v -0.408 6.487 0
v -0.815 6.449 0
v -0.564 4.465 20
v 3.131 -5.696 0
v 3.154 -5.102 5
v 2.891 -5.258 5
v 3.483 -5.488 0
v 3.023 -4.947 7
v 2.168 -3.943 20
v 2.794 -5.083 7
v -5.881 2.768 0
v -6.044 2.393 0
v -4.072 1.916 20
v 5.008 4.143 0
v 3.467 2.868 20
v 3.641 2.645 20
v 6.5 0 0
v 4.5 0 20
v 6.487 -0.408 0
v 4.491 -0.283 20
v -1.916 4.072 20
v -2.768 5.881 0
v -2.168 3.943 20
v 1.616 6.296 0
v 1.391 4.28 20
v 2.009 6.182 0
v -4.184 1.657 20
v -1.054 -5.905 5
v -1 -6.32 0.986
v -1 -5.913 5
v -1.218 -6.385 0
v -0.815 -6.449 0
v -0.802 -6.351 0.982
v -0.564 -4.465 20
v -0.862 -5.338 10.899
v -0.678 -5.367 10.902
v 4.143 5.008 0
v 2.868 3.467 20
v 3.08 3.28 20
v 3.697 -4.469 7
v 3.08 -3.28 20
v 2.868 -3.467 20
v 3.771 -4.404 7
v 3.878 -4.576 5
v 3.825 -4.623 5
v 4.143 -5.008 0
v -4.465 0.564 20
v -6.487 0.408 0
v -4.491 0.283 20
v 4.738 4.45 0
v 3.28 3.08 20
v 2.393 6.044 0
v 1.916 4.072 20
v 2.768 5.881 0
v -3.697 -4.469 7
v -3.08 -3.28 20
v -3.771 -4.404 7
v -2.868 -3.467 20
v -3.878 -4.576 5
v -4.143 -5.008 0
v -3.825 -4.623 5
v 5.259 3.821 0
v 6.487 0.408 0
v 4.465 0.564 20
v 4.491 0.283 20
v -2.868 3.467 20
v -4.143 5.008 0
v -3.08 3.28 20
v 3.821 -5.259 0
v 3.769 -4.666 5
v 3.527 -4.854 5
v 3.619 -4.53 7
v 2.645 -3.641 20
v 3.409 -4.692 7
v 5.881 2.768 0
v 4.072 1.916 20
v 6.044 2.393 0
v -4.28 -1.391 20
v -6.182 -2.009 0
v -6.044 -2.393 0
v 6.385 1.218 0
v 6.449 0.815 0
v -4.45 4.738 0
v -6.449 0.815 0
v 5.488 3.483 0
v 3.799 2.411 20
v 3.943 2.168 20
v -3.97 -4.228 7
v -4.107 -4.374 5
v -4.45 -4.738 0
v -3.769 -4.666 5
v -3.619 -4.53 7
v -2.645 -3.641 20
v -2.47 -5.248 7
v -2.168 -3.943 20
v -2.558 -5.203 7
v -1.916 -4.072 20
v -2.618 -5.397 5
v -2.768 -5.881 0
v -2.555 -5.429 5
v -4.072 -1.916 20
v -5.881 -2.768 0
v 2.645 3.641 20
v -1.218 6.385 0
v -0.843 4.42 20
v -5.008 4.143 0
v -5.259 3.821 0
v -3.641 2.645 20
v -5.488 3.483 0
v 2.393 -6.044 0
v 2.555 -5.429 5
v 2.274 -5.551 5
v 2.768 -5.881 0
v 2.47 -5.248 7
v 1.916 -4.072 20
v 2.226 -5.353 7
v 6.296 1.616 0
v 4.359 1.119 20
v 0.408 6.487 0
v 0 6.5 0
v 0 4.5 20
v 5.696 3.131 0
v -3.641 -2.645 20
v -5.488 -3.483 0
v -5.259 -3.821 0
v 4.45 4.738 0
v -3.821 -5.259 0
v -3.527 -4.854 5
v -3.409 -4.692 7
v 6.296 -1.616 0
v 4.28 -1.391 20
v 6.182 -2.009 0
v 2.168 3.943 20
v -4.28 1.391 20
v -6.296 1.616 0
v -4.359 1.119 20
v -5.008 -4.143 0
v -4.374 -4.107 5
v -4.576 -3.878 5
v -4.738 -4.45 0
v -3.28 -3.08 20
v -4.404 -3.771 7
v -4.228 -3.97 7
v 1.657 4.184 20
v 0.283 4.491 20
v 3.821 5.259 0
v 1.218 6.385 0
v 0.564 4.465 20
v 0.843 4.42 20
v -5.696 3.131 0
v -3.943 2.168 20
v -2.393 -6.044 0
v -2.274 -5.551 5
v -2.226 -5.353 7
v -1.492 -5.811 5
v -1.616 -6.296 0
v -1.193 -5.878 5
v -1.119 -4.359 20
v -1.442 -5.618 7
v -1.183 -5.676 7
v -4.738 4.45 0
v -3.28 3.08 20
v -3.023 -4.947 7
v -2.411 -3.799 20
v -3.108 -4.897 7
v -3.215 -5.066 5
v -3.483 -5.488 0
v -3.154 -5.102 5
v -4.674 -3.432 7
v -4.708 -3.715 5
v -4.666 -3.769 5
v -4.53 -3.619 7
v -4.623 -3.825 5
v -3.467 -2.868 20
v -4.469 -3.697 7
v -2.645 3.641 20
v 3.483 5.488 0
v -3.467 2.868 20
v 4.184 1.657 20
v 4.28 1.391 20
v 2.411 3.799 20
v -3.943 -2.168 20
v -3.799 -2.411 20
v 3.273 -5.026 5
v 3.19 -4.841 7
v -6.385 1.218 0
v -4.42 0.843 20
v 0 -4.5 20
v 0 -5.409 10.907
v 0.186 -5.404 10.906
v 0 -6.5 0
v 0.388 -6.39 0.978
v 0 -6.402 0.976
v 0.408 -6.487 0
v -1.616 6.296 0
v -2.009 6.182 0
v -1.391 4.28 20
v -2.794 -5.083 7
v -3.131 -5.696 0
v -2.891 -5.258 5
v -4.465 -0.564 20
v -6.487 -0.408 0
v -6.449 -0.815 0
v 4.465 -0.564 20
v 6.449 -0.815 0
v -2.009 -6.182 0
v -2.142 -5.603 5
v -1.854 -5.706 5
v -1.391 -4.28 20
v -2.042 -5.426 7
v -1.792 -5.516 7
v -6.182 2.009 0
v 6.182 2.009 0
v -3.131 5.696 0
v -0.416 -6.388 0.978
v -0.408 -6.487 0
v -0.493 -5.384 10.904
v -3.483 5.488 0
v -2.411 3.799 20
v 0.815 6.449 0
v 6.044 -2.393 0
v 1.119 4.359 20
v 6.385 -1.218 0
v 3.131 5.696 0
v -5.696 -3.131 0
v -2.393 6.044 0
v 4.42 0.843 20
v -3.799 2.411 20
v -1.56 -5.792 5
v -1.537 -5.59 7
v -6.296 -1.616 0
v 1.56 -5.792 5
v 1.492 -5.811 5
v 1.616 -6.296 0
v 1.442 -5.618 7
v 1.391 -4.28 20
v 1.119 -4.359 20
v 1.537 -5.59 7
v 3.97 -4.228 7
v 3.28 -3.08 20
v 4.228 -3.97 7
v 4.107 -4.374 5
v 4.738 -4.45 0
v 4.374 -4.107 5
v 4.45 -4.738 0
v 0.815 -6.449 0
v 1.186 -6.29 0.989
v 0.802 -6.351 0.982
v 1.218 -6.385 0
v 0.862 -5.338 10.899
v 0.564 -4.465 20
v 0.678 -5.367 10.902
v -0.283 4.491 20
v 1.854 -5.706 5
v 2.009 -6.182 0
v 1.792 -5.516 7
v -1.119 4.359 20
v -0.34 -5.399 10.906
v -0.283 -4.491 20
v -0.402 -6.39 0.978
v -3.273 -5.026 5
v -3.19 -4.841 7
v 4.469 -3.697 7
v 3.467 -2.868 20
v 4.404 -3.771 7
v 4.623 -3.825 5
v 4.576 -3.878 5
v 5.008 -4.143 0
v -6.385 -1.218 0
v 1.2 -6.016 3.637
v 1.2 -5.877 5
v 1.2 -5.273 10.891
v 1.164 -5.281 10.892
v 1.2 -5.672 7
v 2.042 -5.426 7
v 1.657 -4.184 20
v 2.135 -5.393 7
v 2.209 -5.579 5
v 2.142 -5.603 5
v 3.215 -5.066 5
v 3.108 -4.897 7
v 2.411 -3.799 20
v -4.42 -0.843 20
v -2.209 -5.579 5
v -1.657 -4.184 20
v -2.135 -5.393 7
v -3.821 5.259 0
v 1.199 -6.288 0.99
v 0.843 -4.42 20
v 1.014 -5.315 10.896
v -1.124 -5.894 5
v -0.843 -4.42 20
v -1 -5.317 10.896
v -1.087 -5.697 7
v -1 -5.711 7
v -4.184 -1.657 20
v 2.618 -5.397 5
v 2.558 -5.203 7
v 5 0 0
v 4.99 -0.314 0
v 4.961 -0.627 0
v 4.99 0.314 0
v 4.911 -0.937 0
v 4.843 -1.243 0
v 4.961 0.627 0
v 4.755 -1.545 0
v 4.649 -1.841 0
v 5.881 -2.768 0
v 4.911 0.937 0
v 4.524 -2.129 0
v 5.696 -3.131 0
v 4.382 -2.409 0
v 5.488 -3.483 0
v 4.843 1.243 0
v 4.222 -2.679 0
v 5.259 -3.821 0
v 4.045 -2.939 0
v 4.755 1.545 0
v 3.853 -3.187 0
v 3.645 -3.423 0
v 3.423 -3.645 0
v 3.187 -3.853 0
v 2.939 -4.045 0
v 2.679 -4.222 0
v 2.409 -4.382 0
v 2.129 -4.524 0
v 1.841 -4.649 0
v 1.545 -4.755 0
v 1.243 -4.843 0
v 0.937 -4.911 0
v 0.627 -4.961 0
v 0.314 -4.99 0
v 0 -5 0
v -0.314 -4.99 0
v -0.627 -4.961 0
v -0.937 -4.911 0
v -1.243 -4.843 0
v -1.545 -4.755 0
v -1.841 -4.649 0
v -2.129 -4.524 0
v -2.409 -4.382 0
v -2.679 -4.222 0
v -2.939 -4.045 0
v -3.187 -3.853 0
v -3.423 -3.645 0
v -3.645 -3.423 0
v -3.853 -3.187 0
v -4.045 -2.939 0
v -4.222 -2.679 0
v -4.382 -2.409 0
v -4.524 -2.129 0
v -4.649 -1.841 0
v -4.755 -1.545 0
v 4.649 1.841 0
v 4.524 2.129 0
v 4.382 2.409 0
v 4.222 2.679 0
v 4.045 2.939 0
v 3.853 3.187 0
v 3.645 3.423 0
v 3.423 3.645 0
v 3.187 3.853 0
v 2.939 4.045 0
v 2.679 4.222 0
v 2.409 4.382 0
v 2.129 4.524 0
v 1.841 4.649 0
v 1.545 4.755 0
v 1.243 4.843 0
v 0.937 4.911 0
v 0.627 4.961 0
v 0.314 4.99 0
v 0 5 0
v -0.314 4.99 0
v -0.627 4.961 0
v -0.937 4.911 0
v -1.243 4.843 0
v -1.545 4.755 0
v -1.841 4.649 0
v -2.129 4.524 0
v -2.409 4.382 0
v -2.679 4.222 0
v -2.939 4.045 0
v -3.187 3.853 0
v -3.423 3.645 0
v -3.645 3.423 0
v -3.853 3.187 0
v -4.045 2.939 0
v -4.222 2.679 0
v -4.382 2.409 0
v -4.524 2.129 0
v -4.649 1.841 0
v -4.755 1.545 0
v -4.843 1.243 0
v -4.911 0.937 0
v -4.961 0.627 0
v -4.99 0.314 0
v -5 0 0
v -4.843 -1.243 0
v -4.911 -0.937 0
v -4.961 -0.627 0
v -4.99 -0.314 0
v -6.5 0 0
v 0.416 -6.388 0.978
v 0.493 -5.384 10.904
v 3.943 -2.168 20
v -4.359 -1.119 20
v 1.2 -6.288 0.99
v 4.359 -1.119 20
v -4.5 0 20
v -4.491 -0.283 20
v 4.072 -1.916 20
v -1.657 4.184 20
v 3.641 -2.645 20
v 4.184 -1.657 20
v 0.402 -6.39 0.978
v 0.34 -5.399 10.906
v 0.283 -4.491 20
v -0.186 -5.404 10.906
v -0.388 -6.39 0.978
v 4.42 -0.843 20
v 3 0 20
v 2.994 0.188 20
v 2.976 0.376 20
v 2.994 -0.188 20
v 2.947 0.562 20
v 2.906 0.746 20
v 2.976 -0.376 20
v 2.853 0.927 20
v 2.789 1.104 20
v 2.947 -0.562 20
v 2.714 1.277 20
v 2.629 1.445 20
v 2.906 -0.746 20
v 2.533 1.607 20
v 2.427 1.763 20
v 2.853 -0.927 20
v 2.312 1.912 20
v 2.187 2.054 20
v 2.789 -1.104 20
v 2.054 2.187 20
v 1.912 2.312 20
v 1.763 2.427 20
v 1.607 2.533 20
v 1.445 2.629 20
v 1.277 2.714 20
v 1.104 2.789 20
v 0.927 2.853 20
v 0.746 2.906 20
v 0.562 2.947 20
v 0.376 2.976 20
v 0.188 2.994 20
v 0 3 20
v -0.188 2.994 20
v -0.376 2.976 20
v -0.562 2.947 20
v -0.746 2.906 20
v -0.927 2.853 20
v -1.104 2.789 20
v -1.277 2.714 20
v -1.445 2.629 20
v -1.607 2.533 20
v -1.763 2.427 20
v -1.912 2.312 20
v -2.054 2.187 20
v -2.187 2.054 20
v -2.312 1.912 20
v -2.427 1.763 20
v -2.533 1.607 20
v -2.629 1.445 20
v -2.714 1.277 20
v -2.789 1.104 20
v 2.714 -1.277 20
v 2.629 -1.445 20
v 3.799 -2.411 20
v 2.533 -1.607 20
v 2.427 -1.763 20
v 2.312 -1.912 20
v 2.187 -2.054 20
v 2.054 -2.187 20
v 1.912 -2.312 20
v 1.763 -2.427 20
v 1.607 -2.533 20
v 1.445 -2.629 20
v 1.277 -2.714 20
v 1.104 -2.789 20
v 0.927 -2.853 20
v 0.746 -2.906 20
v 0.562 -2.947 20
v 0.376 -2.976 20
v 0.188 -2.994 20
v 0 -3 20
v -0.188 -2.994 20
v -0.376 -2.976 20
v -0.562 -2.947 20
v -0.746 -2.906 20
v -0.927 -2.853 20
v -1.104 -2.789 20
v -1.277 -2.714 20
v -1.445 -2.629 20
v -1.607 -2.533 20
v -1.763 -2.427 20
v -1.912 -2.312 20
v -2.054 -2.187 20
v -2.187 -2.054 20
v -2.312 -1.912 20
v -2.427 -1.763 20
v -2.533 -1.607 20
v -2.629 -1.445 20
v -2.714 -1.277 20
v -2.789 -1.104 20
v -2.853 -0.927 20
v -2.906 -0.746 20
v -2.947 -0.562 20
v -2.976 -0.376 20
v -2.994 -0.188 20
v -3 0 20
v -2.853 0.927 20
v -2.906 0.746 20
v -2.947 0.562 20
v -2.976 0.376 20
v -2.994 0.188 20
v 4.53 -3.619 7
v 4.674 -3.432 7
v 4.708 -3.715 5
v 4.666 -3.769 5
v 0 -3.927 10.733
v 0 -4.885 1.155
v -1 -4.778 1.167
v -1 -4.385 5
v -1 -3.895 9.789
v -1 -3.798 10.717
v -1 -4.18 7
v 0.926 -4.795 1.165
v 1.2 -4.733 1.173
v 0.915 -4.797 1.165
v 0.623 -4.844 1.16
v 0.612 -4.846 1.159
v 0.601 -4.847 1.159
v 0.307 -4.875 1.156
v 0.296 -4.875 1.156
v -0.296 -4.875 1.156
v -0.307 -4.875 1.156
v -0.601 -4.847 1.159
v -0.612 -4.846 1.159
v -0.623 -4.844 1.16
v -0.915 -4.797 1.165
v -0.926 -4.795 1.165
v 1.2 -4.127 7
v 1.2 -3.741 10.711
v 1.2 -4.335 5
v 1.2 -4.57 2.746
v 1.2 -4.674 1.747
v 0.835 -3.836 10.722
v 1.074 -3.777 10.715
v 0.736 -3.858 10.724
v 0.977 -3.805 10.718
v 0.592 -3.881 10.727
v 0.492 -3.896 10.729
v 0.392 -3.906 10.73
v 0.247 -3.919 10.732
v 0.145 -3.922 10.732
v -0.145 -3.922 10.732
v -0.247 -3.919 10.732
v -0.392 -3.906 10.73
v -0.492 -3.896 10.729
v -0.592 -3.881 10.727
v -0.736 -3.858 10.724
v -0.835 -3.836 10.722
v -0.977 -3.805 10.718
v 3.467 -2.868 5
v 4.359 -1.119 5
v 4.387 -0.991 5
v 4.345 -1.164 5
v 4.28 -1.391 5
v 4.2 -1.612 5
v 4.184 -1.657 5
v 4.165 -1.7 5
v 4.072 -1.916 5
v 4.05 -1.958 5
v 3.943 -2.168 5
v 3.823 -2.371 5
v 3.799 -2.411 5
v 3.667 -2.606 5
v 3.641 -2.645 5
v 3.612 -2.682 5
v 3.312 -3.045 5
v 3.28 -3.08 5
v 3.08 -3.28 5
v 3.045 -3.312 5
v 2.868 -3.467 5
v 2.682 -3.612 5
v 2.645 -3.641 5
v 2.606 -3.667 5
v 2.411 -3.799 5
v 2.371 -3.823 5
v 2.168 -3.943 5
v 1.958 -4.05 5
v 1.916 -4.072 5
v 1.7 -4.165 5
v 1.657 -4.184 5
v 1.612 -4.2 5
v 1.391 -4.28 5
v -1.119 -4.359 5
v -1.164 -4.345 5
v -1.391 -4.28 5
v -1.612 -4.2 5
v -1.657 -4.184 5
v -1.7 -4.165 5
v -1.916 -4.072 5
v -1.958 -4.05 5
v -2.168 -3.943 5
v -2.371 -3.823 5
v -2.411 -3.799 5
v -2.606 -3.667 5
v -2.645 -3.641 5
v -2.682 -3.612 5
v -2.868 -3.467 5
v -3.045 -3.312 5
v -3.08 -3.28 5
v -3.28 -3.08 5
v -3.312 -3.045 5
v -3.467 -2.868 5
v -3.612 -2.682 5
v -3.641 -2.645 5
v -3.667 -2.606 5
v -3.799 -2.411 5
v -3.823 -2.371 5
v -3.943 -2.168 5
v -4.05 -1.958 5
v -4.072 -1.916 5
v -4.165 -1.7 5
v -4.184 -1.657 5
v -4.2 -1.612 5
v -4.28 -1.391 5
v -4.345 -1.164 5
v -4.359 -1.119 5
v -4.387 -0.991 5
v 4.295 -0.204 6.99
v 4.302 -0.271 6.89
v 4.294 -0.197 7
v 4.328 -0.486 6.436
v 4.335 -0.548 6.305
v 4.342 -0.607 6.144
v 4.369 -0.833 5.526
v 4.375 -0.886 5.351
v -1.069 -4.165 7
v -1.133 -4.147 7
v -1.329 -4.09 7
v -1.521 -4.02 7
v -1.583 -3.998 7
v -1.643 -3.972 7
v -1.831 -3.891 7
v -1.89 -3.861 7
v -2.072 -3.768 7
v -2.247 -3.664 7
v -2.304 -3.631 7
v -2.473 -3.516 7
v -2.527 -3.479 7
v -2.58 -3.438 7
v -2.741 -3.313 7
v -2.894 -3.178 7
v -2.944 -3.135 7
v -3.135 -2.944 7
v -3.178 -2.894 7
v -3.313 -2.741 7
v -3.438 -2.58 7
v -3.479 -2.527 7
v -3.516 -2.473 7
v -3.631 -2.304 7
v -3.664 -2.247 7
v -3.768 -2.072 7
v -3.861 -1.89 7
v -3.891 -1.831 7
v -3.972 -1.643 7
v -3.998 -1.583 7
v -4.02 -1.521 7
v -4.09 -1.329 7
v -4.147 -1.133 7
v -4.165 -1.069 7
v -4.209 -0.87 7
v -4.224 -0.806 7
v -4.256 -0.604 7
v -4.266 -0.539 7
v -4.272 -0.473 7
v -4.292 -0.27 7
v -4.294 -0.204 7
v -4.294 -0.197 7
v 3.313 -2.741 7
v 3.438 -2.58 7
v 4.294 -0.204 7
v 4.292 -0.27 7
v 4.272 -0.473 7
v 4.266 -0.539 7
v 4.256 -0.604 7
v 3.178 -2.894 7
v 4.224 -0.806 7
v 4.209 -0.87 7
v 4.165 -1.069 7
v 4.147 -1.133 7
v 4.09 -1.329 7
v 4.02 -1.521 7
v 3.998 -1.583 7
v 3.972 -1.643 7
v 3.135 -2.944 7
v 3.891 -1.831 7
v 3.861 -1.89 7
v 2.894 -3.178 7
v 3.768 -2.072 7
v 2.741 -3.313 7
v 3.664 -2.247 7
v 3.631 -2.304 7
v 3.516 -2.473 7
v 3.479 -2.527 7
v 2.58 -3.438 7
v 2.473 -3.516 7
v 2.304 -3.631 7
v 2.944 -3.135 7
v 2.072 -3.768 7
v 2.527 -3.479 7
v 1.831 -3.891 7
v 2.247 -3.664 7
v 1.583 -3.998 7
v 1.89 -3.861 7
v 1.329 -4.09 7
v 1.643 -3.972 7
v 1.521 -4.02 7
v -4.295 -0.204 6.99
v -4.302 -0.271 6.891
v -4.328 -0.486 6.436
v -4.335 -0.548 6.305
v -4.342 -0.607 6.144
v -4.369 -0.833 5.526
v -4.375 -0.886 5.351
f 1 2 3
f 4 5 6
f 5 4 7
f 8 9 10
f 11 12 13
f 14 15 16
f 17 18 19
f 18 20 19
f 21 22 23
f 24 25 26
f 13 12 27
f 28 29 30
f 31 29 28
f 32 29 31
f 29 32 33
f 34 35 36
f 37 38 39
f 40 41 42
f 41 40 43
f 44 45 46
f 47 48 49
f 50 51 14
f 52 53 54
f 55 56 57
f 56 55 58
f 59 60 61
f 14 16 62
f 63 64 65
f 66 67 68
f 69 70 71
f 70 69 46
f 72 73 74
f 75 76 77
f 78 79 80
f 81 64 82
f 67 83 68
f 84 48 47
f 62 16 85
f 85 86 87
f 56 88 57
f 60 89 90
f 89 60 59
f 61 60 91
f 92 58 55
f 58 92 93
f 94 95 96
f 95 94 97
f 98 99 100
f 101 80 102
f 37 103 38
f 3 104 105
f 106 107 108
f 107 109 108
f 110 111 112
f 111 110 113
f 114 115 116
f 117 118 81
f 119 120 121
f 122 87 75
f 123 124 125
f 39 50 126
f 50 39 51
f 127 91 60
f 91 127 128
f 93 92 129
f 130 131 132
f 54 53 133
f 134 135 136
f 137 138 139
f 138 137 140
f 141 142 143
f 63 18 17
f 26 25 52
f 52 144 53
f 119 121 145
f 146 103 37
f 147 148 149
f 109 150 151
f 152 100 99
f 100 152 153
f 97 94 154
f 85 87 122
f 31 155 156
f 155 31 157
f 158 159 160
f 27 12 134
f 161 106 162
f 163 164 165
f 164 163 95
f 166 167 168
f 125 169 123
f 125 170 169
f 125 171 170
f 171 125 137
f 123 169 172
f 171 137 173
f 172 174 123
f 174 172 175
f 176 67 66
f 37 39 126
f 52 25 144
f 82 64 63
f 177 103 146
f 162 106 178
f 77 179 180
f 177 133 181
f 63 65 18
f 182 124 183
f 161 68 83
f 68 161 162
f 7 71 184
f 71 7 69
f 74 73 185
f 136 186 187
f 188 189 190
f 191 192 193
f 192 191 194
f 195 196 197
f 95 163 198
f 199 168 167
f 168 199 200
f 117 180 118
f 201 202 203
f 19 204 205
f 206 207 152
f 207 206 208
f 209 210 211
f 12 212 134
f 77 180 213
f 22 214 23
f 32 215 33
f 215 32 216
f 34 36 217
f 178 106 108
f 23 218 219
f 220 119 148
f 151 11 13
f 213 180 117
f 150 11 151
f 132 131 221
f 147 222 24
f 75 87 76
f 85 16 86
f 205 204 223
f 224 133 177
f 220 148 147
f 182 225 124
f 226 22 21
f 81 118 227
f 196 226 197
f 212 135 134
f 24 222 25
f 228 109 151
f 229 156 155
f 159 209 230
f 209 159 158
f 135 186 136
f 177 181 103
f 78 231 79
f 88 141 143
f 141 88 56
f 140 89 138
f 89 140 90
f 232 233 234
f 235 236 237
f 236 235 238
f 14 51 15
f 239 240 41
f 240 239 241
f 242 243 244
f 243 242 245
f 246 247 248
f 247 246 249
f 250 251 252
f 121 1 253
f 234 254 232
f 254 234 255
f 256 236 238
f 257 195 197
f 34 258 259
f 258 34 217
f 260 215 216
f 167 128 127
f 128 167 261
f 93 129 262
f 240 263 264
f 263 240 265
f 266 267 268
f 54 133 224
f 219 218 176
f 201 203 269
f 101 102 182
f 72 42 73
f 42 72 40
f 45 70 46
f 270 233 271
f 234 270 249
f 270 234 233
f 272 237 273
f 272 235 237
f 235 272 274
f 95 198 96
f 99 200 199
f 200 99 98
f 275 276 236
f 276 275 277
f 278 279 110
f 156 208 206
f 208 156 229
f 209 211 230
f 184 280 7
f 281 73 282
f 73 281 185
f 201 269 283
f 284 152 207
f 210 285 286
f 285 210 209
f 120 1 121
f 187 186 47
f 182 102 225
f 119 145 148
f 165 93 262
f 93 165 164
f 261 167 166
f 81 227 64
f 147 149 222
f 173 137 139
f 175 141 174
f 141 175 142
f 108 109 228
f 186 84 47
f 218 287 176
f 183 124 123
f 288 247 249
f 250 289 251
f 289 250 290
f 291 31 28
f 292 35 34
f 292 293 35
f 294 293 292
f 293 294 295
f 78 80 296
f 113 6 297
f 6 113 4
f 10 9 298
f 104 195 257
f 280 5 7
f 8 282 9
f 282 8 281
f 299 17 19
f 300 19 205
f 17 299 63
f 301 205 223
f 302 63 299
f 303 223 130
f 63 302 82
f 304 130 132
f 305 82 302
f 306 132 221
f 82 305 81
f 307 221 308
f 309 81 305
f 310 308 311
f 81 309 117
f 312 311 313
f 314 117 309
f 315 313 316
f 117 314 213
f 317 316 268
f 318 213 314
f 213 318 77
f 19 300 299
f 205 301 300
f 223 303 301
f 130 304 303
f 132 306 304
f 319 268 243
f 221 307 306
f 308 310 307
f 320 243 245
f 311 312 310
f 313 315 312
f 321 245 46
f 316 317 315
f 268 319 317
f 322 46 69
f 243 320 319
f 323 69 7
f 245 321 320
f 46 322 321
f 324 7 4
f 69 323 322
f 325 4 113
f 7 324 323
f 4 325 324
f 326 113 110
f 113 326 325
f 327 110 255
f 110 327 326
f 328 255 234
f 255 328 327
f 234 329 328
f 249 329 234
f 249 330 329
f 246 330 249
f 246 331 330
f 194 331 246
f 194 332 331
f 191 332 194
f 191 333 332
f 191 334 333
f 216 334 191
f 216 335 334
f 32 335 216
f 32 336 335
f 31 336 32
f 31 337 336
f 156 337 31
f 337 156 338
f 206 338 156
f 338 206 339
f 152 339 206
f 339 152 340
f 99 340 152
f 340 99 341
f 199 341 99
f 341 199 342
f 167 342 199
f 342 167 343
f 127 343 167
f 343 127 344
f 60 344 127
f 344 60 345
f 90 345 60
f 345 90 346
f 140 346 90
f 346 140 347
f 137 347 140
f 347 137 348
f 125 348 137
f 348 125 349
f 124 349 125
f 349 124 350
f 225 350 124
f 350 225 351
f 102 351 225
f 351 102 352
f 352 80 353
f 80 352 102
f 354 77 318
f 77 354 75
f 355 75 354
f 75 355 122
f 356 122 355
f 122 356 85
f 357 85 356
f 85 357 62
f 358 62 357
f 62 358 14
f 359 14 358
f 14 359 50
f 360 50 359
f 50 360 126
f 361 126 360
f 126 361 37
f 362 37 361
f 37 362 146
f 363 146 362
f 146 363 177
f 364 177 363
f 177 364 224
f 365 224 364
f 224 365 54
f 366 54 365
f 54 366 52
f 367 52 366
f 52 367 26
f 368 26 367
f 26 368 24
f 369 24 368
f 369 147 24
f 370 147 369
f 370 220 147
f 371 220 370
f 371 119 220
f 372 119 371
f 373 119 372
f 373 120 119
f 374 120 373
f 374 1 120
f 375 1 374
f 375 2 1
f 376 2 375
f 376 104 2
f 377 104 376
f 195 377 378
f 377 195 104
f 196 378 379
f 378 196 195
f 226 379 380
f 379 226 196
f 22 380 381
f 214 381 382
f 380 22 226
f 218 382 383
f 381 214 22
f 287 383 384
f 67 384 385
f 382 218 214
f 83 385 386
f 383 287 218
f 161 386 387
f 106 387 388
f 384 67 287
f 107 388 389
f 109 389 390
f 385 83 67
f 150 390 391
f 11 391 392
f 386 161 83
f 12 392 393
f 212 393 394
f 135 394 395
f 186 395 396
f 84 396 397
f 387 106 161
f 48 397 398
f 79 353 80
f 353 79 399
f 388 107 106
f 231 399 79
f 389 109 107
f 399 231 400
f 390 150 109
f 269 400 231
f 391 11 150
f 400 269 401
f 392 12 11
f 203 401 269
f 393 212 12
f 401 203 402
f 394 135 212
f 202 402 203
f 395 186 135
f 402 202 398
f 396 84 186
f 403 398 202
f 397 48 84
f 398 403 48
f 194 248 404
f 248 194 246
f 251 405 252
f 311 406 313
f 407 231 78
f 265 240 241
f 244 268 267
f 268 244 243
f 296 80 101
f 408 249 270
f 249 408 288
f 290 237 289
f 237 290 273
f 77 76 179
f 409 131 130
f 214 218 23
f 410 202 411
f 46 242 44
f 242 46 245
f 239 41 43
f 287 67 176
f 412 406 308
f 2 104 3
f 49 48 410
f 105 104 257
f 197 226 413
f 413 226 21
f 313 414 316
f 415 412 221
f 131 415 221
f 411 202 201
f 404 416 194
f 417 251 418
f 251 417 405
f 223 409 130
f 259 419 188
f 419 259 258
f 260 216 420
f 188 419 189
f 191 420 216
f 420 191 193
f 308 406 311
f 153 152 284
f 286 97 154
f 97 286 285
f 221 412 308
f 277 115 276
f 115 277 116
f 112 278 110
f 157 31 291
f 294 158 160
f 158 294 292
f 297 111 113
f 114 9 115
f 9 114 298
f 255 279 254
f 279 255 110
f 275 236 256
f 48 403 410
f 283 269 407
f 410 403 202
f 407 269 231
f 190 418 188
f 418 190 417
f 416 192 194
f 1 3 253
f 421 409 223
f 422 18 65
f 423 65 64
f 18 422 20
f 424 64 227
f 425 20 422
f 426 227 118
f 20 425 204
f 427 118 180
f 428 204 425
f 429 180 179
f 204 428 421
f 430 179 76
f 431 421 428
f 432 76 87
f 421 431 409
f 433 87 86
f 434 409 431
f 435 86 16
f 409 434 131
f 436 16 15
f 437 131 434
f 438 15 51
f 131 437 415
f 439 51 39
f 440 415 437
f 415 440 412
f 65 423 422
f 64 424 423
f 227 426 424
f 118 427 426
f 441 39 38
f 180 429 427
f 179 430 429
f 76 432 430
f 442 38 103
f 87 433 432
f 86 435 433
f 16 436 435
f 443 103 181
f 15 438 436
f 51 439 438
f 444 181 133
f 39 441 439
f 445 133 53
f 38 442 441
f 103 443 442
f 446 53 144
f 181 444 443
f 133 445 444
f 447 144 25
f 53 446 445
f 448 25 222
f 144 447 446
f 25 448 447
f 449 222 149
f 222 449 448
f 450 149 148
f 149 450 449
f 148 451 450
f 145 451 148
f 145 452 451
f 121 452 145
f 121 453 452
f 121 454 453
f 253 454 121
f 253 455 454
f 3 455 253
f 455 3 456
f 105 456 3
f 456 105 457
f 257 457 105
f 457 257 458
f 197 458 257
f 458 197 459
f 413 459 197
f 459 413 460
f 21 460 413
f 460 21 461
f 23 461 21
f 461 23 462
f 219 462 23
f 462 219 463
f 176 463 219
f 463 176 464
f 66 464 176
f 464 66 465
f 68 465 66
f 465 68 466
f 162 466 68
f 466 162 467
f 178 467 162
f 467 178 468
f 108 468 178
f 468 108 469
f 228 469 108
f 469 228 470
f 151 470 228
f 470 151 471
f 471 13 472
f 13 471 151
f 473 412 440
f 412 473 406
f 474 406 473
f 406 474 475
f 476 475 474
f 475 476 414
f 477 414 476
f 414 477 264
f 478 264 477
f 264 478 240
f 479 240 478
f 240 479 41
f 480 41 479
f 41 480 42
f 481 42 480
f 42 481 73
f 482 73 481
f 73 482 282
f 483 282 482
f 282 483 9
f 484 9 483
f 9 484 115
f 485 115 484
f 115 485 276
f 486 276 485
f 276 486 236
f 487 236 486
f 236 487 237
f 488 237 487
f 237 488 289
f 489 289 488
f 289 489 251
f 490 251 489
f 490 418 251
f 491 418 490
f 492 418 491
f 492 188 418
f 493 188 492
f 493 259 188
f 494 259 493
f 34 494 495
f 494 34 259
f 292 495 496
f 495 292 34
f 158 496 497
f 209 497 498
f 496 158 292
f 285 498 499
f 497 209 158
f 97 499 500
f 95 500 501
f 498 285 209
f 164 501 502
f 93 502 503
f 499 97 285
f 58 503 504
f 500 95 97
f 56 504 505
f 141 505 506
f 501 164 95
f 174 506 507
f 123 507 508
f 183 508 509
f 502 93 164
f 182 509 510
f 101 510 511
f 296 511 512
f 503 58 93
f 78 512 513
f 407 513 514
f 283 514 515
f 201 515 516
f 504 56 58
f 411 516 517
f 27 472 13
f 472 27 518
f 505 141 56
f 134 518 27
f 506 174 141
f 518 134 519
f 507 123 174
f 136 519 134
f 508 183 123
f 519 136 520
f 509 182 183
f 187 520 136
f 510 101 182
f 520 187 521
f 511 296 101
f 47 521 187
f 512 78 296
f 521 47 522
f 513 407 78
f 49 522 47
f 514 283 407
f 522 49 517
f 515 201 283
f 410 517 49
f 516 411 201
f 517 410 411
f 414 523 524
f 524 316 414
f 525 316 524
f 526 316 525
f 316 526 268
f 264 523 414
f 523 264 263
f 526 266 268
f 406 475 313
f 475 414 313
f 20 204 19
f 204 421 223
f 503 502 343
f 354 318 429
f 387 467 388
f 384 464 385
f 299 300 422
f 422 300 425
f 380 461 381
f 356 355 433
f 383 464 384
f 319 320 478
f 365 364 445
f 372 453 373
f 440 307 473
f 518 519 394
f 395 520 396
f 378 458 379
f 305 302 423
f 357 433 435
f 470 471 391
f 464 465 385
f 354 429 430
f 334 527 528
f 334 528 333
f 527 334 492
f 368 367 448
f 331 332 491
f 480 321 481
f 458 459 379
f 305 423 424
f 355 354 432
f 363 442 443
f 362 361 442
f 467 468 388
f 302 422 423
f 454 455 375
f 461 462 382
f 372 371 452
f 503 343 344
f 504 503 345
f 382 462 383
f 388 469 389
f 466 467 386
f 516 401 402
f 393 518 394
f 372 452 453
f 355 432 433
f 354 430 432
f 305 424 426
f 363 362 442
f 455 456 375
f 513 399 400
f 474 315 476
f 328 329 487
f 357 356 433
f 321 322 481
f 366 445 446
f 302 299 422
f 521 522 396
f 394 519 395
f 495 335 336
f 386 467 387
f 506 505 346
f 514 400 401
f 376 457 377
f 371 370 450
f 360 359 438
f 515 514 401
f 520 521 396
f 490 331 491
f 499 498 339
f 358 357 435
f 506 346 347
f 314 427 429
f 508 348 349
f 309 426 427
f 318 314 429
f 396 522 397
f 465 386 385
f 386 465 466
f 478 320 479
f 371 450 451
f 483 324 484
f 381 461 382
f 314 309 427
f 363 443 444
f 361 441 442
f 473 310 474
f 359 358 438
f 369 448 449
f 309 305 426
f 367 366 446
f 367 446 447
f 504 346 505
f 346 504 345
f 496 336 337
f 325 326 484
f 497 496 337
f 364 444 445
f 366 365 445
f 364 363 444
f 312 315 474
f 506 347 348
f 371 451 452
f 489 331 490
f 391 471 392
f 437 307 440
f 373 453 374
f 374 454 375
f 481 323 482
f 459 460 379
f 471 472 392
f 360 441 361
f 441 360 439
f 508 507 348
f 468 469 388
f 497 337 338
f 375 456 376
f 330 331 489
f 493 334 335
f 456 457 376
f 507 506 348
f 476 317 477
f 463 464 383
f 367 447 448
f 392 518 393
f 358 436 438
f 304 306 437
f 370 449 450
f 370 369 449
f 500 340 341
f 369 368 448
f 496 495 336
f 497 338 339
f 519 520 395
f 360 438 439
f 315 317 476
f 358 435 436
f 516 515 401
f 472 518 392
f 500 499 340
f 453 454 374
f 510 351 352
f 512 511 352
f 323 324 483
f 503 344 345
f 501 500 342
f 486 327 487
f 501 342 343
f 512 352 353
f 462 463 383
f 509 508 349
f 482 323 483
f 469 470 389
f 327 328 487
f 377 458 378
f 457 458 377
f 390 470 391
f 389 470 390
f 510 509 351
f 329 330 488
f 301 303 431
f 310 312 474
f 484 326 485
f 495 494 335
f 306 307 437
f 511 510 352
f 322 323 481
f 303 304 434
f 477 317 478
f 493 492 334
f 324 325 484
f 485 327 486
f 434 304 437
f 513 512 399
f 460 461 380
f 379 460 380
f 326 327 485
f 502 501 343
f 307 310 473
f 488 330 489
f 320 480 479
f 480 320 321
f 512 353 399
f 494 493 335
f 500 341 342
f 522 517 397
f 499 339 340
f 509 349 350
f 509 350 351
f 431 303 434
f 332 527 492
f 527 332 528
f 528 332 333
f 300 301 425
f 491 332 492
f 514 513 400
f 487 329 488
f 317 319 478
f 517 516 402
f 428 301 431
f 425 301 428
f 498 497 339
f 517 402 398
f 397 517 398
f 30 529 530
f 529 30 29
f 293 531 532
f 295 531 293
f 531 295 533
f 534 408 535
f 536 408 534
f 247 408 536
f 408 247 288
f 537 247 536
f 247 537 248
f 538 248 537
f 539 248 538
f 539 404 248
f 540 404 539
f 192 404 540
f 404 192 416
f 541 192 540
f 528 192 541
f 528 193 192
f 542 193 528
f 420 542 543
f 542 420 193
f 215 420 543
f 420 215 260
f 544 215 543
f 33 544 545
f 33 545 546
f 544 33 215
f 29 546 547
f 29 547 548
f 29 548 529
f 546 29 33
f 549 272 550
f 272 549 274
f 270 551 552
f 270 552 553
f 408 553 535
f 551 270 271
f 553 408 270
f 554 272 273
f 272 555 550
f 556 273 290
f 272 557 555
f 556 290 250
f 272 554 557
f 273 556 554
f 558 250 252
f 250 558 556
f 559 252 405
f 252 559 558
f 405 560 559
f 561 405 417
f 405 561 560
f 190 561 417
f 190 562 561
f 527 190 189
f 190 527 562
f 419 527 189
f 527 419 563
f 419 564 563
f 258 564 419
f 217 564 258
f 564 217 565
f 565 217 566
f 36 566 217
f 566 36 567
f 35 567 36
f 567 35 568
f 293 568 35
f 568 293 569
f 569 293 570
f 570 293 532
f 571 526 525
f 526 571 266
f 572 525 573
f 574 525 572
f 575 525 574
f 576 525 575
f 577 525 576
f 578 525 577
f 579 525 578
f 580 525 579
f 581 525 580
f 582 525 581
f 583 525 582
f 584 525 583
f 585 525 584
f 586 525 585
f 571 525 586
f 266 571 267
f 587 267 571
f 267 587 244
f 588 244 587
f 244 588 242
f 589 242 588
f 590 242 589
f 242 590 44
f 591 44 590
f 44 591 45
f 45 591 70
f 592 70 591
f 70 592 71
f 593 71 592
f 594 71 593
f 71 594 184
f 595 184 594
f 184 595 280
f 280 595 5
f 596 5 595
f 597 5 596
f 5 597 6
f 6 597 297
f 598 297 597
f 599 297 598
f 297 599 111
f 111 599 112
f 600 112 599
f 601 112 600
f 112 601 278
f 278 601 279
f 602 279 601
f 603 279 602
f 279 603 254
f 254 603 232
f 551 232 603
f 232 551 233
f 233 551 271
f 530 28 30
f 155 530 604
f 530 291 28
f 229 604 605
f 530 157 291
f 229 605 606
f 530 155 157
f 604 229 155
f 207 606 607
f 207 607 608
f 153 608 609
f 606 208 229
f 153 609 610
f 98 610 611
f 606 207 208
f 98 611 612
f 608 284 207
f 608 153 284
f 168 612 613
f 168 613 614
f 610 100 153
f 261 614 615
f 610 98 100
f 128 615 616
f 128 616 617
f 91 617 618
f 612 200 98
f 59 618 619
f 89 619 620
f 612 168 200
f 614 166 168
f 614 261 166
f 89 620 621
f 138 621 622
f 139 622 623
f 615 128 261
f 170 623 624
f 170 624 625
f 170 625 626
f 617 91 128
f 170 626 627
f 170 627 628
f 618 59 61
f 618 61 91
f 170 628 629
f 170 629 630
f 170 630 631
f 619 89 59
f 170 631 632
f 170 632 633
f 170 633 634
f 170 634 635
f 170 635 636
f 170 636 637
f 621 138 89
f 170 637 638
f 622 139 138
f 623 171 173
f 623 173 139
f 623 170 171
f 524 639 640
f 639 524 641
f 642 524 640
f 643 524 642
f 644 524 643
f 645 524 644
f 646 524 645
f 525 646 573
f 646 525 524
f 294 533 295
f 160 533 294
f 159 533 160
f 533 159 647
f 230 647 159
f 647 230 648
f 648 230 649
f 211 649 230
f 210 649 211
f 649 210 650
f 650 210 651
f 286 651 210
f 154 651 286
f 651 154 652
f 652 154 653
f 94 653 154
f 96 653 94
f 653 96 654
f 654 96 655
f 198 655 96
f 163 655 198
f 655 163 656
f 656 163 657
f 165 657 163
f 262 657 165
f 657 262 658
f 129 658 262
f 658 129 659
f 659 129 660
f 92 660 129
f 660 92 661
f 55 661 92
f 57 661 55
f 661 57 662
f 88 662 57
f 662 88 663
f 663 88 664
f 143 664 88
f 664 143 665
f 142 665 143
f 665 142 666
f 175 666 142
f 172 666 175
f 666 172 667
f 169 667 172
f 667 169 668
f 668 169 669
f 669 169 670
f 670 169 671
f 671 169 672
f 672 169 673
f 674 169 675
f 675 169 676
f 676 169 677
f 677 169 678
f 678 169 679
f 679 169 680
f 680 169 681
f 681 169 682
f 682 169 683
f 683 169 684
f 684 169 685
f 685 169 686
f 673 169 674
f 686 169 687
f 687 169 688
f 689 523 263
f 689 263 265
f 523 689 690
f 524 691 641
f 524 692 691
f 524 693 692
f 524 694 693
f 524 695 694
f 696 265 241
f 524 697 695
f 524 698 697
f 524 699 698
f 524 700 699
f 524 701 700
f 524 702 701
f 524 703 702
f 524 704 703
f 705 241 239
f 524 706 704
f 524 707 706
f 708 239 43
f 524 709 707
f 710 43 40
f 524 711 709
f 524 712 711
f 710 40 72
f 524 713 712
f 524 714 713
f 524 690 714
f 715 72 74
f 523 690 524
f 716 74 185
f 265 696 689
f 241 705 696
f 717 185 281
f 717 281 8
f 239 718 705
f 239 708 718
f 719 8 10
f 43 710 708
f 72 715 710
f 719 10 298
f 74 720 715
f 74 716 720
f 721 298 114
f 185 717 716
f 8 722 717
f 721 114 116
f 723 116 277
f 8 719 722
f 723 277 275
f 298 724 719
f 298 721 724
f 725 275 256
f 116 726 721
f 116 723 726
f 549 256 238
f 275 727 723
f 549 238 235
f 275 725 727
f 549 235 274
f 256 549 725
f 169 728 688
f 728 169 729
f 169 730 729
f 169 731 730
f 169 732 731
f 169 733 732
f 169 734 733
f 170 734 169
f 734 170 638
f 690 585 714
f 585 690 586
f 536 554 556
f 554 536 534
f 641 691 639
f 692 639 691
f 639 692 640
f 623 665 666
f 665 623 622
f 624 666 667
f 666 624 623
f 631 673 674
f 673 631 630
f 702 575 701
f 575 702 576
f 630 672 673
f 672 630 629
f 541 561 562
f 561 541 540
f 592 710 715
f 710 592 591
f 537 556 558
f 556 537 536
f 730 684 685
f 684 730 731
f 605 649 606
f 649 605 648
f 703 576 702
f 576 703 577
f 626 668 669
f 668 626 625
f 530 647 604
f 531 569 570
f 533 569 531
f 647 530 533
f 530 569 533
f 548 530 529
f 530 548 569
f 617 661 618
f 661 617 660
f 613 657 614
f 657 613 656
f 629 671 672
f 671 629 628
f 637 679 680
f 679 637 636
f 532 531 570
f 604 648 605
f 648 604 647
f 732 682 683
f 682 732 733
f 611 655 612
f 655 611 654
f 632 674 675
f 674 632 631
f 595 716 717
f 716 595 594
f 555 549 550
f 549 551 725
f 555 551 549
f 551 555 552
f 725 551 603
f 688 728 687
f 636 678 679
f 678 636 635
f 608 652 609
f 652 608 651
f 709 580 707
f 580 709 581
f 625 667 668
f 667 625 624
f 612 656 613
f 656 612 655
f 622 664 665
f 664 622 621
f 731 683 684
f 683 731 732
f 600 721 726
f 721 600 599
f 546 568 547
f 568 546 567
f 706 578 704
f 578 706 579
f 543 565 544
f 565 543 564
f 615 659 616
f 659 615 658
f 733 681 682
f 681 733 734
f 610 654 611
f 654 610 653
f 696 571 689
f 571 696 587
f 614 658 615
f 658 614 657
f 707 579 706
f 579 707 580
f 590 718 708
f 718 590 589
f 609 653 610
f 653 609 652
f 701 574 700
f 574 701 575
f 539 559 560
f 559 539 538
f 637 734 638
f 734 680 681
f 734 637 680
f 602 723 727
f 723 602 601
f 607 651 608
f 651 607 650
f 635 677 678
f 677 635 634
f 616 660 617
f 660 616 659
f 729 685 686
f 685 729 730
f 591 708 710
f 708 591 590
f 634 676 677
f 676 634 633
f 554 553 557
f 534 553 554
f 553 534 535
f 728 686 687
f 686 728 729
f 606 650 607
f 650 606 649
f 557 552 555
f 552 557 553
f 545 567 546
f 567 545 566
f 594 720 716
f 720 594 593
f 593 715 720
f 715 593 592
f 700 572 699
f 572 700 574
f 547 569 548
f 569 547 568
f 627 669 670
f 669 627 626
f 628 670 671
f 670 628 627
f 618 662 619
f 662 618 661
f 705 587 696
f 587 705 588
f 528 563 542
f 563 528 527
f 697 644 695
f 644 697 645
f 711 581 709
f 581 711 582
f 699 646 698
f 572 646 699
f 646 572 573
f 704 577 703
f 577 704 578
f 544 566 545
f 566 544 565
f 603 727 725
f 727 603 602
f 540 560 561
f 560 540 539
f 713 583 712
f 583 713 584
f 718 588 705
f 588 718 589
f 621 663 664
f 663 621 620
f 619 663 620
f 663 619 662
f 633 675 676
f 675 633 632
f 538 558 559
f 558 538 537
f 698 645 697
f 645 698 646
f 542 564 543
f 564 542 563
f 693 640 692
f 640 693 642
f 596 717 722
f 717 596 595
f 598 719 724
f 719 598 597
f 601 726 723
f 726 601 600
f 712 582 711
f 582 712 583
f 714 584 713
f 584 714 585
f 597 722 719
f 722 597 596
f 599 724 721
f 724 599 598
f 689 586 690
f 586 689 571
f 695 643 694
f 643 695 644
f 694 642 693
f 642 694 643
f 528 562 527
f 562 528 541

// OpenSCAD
// Code shows generates complete Brymen holder for flexible water pipes.
// Print parts as seperate and glue together, see below.
$fn=100;

module attacher() {
	difference() {
		cube([38.2, 12, 1.4], center=true);
		difference() {
			cube([38.2, 12, 1.4], center=true);
			cylinder(h=1.3, r=19.1, center=true);
		}
	}
	translate([0, 0, 2.0]) cylinder(h=3, r=9.5/2, center=true);
}

module attach_hold() {
	translate([0, 0, -1.6]) {
		difference() {
			cube([34, 12, 4], center=true);
			difference() {
				cube([34, 12, 4], center=true);
				cylinder(h=2, r=17, center=true);
			}
		}
	}
	translate([10, 0, 0]) mount();
	translate([-10, 0, 0]) mount();
}

module mount(margin=0) {
	difference() {
		union() {
			translate([-1, -6, -2.6]) {
				rotate([0, 90, 0]) {
					linear_extrude(2+margin) polygon(points=[[0,-margin],[0,12+margin],[17,10+margin],[17,2-margin]]);
				}
			}
			rotate([0, 0, 90]) {
				translate([-1, -6, -2.6]) {
					rotate([0, 90, 0]) {
						linear_extrude(2) polygon(points=[[0,-margin],[0,12+margin],[17,10+margin],[17,2-margin]]);
					}
				}
			}
		}
		translate([0, 4, -19]) rotate([90, 0, 0]) {
			cylinder(h=20, r1=3, r2=5, center=true);
		}
	}
}

module pipe_mount() {
	difference() {
		union() {
			translate([0, 0, -15]) rotate([90, 0, 0]) {
				translate([0, 0, -10]) {
					difference() {
						cylinder(h=20, r1=4.5, r2=6.5, center=true);
						cylinder(h=20, r1=3, r2=5, center=true);
					}
				}
			}
		}
		translate([0, 6, 4]) mount(0.2);
	}
}

module complete() {
	attacher();
	attach_hold();
	translate([10, -6, -4]) pipe_mount();
	translate([-10, -6, -4]) pipe_mount();
}

// complete();
// Uncomment each line below and print attacher, attach_hold, and pipe_mount as
// seperate parts and glue together.

// translate([0, 0, 0.7]) attacher();
// rotate([0, 180, 0]) attach_hold();
translate([0, -15, 0]) rotate([90, 0, 0]) pipe_mount();

// vim: ts=2:sw=2:noet:commentstring=//\ %s
